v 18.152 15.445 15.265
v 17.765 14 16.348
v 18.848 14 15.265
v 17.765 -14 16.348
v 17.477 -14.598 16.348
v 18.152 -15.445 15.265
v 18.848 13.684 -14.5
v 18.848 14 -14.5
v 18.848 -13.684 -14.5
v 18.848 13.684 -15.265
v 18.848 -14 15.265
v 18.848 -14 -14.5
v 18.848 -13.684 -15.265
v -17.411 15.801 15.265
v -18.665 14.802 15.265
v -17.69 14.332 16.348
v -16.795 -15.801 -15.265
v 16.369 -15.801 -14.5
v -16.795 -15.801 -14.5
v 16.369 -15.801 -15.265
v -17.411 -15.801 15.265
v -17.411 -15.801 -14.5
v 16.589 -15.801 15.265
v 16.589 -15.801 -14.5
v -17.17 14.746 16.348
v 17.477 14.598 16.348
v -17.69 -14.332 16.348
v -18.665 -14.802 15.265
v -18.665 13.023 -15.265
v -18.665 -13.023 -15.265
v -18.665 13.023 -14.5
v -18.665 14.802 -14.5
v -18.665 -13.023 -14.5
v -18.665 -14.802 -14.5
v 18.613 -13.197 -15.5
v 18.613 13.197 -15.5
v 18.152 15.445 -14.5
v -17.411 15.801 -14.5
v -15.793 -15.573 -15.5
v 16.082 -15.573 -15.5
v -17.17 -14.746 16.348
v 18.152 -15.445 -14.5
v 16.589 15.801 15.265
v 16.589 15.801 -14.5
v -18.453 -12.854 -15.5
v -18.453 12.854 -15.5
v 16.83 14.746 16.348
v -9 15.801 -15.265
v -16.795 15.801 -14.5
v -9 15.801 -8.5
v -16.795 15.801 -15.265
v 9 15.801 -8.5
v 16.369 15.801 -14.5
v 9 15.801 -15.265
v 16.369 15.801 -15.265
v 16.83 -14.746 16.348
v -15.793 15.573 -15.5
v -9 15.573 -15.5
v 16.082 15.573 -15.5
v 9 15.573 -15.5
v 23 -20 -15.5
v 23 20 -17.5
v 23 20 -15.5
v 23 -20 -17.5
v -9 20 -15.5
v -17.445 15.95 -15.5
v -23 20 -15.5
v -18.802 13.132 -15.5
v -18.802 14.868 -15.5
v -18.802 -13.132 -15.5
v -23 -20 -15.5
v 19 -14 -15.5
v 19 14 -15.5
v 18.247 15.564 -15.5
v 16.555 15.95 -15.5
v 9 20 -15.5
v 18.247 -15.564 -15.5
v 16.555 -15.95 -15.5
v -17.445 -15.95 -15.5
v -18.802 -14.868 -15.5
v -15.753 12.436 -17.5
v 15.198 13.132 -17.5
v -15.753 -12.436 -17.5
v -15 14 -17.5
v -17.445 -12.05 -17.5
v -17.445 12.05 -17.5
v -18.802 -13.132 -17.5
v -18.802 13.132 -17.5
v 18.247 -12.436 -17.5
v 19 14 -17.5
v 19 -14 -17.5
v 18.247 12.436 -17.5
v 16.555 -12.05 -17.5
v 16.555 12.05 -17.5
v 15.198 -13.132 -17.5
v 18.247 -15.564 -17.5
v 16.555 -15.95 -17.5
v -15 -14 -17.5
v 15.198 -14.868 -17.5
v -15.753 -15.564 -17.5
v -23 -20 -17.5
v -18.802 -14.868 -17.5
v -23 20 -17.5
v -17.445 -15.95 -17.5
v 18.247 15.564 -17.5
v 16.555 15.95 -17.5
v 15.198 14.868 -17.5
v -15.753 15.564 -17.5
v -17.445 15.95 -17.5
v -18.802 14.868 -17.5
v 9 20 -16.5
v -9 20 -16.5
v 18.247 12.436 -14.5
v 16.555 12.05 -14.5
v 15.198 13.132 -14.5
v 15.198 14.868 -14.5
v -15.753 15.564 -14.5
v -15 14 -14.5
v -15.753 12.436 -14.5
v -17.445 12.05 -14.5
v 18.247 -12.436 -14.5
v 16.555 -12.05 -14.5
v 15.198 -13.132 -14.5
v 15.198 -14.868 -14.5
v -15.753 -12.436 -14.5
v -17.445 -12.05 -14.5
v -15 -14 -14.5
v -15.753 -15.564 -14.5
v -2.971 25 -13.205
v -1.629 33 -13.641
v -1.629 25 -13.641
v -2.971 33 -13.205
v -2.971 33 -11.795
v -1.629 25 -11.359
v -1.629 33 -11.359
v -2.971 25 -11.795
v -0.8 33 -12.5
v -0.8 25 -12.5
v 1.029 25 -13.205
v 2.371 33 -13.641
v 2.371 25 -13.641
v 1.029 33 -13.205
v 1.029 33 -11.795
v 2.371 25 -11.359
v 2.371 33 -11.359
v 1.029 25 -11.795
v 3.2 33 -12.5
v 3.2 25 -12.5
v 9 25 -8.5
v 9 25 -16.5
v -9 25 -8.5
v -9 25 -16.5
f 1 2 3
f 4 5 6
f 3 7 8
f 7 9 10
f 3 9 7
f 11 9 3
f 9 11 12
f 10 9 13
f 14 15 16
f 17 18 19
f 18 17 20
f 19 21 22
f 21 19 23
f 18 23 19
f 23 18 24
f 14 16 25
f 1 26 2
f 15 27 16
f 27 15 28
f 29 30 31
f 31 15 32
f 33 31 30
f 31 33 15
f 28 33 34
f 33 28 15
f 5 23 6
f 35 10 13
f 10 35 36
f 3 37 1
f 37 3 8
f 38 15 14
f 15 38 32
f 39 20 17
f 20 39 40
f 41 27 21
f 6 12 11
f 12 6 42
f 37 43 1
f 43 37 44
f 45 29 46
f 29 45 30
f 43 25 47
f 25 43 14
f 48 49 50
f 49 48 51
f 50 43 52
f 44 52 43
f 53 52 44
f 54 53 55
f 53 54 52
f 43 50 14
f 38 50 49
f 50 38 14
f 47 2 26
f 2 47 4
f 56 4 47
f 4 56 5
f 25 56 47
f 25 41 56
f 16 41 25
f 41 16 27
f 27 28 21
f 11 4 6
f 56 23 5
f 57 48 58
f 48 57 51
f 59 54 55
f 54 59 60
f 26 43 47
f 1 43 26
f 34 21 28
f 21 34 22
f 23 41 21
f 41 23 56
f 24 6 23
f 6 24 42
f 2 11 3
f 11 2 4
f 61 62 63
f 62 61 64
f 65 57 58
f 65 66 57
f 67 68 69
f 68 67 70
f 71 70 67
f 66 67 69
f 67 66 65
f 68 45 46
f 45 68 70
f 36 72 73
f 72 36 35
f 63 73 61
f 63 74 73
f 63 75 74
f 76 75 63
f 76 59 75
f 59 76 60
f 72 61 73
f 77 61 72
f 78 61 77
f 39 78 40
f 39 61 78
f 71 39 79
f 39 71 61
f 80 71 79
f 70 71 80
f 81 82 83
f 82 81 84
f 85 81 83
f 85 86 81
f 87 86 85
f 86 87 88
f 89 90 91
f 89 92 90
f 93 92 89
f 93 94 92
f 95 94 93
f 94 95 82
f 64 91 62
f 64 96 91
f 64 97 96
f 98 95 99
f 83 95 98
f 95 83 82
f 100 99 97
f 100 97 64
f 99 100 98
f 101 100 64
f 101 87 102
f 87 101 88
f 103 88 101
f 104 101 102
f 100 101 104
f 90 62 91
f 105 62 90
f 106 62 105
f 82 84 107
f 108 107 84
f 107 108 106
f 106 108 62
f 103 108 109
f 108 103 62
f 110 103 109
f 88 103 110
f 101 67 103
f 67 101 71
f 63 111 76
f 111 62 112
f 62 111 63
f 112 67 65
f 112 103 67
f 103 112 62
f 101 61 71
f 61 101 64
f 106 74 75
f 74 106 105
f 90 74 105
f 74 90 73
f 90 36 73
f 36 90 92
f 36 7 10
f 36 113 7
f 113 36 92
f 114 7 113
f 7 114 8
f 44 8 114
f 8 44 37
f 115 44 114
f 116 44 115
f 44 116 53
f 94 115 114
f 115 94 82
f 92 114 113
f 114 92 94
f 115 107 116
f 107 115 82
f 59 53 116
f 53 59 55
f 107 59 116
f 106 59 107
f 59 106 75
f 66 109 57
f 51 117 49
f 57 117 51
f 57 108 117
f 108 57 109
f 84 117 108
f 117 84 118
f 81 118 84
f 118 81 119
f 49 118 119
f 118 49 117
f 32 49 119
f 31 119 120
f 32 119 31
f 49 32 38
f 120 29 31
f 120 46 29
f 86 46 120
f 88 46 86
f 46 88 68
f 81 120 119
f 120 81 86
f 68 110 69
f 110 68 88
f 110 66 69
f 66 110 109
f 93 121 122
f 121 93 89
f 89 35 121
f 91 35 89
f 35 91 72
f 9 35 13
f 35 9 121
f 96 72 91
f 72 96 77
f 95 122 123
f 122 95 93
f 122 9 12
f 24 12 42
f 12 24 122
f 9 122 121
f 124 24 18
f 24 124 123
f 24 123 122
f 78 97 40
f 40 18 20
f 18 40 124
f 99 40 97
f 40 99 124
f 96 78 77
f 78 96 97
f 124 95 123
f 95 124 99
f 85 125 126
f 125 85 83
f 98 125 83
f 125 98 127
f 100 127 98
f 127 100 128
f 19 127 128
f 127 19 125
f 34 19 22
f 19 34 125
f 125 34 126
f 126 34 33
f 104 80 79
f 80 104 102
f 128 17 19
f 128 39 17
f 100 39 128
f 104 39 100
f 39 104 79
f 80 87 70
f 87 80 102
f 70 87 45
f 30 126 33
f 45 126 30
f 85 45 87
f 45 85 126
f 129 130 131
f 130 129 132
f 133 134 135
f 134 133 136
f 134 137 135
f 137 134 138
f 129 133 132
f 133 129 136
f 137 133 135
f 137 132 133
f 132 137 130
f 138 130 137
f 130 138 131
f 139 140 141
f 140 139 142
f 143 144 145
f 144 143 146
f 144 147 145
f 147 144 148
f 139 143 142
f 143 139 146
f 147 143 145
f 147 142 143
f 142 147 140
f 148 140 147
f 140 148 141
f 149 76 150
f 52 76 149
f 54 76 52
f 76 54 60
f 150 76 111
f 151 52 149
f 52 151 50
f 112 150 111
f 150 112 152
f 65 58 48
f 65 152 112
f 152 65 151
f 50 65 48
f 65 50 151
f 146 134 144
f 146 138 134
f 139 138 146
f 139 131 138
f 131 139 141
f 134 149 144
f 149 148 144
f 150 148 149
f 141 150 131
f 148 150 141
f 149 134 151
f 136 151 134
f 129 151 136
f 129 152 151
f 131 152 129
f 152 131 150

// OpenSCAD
// Parameters
body_L = 38.0; //[19.0:76.0:0.5]
body_W = 32.0; //[16.0:64.0:0.5]
body_H = 33.0; //[16.5:66.0:0.5]
overlap = 1.0; //[0.5:2.0:0.1]
fillet_r = 2.0; //[1.0:4.0:0.25]
flange_thk = 2.0; //[1.0:4.0:0.25]
flange_margin = 4.0; //[2.0:8.0:0.5]
hole_d = 4.0; //[2.0:6.0:0.25]
hole_edge_margin = 6.0; //[4.0:10.0:0.5]
wire_r = 1.2; //[0.6:2.4:0.1]
wire_len = 18.0; //[9.0:36.0:0.5]
wire_spacing = 4.0; //[2.0:8.0:0.5]
terminal_L = 18.0; //[9.0:36.0:0.5]
terminal_W = 10.0; //[5.0:20.0:0.5]
terminal_H = 8.0; //[4.0:16.0:0.5]
label_thk = 0.8; //[0.4:1.6:0.1]
label_margin = 3.0; //[1.5:6.0:0.5]

// Base shapes
module transformer_body_base() {
  cube([body_L - 2*fillet_r, body_W - 2*fillet_r, body_H - 2*fillet_r], center=true);
}

module corner_fillets_sphere() {
  sphere(r=fillet_r, center=true);
}

module mounting_flange() {
  cube([body_L + 2*flange_margin, body_W + 2*flange_margin, flange_thk], center=true);
}

module mounting_hole_cyl(pos) {
  translate(pos)
    cylinder(r=hole_d/2, h=flange_thk + 2*overlap, center=true);
}

module terminal_block() {
  cube([terminal_L, terminal_W, terminal_H], center=true);
}

module lead_wire(pos) {
  translate(pos)
    rotate([90, 0, 0])
      cylinder(r=wire_r, h=wire_len, center=true);
}

module label_plate() {
  cube([body_L - 2*label_margin, body_W - 2*label_margin, label_thk], center=true);
}

// Operations
module corner_fillets() {
  minkowski() {
    transformer_body_base();
    corner_fillets_sphere();
  }
}

module body_plus_flange() {
  union() {
    corner_fillets();
    translate([0, 0, -body_H/2 - flange_thk/2 + overlap])
      mounting_flange();
  }
}

module mounting_holes() {
  union() {
    mounting_hole_cyl([(body_L + 2*flange_margin)/2 - hole_edge_margin, (body_W + 2*flange_margin)/2 - hole_edge_margin, -body_H/2 - flange_thk/2 + overlap]);
    mounting_hole_cyl([-((body_L + 2*flange_margin)/2 - hole_edge_margin), (body_W + 2*flange_margin)/2 - hole_edge_margin, -body_H/2 - flange_thk/2 + overlap]);
    mounting_hole_cyl([(body_L + 2*flange_margin)/2 - hole_edge_margin, -((body_W + 2*flange_margin)/2 - hole_edge_margin), -body_H/2 - flange_thk/2 + overlap]);
    mounting_hole_cyl([-((body_L + 2*flange_margin)/2 - hole_edge_margin), -((body_W + 2*flange_margin)/2 - hole_edge_margin), -body_H/2 - flange_thk/2 + overlap]);
  }
}

module flange_with_holes() {
  difference() {
    body_plus_flange();
    mounting_holes();
  }
}

module lead_wires() {
  union() {
    lead_wire([-wire_spacing/2, body_W/2 + wire_len/2 - overlap, -body_H/2 + terminal_H/2]);
    lead_wire([wire_spacing/2, body_W/2 + wire_len/2 - overlap, -body_H/2 + terminal_H/2]);
  }
}

module transformer_complete() {
  union() {
    flange_with_holes();
    translate([0, body_W/2 + terminal_W/2 - overlap, -body_H/2 + terminal_H/2])
      terminal_block();
    lead_wires();
    translate([0, 0, body_H/2 + label_thk/2 - overlap])
      label_plate();
  }
}

// Final output
transformer_complete();
